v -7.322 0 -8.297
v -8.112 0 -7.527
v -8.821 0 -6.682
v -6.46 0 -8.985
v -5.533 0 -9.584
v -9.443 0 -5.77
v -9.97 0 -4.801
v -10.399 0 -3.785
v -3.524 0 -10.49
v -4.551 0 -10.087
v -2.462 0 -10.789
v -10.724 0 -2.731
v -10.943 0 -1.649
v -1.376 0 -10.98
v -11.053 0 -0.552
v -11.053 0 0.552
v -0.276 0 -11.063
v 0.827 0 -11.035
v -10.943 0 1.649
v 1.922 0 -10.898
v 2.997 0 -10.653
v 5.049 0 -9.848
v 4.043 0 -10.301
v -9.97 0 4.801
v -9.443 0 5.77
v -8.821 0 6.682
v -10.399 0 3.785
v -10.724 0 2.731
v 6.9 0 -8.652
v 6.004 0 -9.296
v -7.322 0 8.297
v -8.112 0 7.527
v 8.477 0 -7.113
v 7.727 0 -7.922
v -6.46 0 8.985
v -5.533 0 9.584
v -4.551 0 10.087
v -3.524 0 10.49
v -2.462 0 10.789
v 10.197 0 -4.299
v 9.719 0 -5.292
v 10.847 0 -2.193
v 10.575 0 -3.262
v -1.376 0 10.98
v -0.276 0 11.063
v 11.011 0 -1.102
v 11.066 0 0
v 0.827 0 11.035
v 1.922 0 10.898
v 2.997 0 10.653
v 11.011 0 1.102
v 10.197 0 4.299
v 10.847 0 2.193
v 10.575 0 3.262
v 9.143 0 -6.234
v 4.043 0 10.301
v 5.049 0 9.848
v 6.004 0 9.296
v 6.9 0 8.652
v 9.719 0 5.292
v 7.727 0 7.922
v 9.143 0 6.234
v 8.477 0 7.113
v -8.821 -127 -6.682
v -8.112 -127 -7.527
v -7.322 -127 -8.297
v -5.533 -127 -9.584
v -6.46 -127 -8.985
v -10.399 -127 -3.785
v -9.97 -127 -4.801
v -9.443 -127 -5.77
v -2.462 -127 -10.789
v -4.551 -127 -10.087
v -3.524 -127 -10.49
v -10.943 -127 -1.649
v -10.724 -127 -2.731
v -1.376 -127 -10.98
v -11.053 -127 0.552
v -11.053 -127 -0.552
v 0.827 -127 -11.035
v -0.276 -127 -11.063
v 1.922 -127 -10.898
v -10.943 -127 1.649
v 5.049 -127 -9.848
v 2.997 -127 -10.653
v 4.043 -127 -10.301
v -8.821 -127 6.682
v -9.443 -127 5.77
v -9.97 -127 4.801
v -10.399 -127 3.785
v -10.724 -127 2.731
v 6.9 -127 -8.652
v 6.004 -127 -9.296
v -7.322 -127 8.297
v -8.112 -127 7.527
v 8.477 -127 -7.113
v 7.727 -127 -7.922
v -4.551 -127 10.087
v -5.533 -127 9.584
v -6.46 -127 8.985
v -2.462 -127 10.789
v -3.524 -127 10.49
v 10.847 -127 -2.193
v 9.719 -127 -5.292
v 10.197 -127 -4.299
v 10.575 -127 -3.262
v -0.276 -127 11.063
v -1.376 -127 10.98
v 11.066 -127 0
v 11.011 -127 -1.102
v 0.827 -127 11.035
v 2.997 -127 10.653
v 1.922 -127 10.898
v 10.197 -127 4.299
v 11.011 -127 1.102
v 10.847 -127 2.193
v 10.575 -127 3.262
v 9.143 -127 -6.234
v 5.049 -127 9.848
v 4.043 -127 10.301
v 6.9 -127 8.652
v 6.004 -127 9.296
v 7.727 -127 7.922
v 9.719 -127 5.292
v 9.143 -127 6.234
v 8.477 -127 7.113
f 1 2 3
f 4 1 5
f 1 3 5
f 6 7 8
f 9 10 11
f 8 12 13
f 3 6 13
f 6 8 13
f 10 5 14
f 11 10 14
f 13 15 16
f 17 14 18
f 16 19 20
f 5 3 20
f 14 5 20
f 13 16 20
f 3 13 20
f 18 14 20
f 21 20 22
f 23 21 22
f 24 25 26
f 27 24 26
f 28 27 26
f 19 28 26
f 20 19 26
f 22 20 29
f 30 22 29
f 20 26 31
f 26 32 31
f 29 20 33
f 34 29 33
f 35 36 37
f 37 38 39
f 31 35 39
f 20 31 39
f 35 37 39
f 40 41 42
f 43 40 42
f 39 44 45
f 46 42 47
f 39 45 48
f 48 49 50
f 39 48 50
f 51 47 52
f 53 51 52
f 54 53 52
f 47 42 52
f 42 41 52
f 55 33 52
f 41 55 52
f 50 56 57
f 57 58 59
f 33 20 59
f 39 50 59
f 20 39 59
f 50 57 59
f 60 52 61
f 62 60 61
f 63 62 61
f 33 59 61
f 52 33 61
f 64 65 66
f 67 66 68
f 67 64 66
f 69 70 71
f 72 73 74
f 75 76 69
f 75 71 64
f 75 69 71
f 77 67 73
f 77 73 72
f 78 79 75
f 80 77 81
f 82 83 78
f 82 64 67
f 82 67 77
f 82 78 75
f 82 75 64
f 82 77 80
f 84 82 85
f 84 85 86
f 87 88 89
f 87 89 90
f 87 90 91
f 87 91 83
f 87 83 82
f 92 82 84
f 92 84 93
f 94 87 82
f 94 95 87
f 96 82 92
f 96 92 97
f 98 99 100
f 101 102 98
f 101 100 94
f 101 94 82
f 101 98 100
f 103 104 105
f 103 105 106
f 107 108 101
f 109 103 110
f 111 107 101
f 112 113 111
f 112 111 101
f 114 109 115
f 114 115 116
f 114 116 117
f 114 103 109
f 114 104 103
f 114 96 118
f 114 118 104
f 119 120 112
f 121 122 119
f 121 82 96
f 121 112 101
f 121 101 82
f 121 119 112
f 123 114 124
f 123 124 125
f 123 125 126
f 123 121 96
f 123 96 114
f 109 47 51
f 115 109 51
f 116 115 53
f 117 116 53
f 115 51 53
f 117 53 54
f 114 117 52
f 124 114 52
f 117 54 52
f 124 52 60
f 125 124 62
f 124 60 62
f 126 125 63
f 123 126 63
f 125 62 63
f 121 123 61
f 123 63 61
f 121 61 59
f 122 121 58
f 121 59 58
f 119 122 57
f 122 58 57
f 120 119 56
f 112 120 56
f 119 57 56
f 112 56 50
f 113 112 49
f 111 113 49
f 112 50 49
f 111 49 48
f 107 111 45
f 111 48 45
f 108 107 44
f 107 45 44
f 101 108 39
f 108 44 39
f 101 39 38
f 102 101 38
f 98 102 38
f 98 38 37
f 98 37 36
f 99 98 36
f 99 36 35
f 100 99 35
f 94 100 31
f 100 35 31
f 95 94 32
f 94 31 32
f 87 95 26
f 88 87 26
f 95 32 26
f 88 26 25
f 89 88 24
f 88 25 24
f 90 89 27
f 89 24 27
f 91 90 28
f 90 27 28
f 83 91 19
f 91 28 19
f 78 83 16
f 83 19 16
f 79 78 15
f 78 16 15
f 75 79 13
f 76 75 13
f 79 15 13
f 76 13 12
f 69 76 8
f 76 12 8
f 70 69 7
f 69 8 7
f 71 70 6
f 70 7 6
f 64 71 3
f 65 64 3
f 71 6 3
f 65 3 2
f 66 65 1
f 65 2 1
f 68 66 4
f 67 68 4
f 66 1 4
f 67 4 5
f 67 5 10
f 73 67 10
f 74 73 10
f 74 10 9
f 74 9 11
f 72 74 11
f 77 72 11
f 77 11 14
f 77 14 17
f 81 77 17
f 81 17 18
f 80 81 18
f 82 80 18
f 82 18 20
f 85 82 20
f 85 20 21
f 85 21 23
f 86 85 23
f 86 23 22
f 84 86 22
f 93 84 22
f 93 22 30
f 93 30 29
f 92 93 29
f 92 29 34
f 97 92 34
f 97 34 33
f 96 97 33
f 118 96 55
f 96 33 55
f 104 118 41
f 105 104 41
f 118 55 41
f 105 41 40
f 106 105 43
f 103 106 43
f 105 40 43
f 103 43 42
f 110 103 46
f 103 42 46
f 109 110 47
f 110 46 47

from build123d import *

# Parameters (mm, degrees)
F0_R     = 9.5208183928
F1_DEPTH = 101.6
F3_R     = 11.0662804661
F4_DEPTH = 127


with BuildPart() as f1:
    # F0 (on Front) → F1 (new body)
    with BuildSketch(Plane.XZ):
        Circle(F0_R)
    extrude(amount=F1_DEPTH)


with BuildPart() as f4:
    # F3 (on Front) → F4 (new body)
    with BuildSketch(Plane.XZ):
        Circle(F3_R)
    extrude(amount=F4_DEPTH)


solid = f4.part
